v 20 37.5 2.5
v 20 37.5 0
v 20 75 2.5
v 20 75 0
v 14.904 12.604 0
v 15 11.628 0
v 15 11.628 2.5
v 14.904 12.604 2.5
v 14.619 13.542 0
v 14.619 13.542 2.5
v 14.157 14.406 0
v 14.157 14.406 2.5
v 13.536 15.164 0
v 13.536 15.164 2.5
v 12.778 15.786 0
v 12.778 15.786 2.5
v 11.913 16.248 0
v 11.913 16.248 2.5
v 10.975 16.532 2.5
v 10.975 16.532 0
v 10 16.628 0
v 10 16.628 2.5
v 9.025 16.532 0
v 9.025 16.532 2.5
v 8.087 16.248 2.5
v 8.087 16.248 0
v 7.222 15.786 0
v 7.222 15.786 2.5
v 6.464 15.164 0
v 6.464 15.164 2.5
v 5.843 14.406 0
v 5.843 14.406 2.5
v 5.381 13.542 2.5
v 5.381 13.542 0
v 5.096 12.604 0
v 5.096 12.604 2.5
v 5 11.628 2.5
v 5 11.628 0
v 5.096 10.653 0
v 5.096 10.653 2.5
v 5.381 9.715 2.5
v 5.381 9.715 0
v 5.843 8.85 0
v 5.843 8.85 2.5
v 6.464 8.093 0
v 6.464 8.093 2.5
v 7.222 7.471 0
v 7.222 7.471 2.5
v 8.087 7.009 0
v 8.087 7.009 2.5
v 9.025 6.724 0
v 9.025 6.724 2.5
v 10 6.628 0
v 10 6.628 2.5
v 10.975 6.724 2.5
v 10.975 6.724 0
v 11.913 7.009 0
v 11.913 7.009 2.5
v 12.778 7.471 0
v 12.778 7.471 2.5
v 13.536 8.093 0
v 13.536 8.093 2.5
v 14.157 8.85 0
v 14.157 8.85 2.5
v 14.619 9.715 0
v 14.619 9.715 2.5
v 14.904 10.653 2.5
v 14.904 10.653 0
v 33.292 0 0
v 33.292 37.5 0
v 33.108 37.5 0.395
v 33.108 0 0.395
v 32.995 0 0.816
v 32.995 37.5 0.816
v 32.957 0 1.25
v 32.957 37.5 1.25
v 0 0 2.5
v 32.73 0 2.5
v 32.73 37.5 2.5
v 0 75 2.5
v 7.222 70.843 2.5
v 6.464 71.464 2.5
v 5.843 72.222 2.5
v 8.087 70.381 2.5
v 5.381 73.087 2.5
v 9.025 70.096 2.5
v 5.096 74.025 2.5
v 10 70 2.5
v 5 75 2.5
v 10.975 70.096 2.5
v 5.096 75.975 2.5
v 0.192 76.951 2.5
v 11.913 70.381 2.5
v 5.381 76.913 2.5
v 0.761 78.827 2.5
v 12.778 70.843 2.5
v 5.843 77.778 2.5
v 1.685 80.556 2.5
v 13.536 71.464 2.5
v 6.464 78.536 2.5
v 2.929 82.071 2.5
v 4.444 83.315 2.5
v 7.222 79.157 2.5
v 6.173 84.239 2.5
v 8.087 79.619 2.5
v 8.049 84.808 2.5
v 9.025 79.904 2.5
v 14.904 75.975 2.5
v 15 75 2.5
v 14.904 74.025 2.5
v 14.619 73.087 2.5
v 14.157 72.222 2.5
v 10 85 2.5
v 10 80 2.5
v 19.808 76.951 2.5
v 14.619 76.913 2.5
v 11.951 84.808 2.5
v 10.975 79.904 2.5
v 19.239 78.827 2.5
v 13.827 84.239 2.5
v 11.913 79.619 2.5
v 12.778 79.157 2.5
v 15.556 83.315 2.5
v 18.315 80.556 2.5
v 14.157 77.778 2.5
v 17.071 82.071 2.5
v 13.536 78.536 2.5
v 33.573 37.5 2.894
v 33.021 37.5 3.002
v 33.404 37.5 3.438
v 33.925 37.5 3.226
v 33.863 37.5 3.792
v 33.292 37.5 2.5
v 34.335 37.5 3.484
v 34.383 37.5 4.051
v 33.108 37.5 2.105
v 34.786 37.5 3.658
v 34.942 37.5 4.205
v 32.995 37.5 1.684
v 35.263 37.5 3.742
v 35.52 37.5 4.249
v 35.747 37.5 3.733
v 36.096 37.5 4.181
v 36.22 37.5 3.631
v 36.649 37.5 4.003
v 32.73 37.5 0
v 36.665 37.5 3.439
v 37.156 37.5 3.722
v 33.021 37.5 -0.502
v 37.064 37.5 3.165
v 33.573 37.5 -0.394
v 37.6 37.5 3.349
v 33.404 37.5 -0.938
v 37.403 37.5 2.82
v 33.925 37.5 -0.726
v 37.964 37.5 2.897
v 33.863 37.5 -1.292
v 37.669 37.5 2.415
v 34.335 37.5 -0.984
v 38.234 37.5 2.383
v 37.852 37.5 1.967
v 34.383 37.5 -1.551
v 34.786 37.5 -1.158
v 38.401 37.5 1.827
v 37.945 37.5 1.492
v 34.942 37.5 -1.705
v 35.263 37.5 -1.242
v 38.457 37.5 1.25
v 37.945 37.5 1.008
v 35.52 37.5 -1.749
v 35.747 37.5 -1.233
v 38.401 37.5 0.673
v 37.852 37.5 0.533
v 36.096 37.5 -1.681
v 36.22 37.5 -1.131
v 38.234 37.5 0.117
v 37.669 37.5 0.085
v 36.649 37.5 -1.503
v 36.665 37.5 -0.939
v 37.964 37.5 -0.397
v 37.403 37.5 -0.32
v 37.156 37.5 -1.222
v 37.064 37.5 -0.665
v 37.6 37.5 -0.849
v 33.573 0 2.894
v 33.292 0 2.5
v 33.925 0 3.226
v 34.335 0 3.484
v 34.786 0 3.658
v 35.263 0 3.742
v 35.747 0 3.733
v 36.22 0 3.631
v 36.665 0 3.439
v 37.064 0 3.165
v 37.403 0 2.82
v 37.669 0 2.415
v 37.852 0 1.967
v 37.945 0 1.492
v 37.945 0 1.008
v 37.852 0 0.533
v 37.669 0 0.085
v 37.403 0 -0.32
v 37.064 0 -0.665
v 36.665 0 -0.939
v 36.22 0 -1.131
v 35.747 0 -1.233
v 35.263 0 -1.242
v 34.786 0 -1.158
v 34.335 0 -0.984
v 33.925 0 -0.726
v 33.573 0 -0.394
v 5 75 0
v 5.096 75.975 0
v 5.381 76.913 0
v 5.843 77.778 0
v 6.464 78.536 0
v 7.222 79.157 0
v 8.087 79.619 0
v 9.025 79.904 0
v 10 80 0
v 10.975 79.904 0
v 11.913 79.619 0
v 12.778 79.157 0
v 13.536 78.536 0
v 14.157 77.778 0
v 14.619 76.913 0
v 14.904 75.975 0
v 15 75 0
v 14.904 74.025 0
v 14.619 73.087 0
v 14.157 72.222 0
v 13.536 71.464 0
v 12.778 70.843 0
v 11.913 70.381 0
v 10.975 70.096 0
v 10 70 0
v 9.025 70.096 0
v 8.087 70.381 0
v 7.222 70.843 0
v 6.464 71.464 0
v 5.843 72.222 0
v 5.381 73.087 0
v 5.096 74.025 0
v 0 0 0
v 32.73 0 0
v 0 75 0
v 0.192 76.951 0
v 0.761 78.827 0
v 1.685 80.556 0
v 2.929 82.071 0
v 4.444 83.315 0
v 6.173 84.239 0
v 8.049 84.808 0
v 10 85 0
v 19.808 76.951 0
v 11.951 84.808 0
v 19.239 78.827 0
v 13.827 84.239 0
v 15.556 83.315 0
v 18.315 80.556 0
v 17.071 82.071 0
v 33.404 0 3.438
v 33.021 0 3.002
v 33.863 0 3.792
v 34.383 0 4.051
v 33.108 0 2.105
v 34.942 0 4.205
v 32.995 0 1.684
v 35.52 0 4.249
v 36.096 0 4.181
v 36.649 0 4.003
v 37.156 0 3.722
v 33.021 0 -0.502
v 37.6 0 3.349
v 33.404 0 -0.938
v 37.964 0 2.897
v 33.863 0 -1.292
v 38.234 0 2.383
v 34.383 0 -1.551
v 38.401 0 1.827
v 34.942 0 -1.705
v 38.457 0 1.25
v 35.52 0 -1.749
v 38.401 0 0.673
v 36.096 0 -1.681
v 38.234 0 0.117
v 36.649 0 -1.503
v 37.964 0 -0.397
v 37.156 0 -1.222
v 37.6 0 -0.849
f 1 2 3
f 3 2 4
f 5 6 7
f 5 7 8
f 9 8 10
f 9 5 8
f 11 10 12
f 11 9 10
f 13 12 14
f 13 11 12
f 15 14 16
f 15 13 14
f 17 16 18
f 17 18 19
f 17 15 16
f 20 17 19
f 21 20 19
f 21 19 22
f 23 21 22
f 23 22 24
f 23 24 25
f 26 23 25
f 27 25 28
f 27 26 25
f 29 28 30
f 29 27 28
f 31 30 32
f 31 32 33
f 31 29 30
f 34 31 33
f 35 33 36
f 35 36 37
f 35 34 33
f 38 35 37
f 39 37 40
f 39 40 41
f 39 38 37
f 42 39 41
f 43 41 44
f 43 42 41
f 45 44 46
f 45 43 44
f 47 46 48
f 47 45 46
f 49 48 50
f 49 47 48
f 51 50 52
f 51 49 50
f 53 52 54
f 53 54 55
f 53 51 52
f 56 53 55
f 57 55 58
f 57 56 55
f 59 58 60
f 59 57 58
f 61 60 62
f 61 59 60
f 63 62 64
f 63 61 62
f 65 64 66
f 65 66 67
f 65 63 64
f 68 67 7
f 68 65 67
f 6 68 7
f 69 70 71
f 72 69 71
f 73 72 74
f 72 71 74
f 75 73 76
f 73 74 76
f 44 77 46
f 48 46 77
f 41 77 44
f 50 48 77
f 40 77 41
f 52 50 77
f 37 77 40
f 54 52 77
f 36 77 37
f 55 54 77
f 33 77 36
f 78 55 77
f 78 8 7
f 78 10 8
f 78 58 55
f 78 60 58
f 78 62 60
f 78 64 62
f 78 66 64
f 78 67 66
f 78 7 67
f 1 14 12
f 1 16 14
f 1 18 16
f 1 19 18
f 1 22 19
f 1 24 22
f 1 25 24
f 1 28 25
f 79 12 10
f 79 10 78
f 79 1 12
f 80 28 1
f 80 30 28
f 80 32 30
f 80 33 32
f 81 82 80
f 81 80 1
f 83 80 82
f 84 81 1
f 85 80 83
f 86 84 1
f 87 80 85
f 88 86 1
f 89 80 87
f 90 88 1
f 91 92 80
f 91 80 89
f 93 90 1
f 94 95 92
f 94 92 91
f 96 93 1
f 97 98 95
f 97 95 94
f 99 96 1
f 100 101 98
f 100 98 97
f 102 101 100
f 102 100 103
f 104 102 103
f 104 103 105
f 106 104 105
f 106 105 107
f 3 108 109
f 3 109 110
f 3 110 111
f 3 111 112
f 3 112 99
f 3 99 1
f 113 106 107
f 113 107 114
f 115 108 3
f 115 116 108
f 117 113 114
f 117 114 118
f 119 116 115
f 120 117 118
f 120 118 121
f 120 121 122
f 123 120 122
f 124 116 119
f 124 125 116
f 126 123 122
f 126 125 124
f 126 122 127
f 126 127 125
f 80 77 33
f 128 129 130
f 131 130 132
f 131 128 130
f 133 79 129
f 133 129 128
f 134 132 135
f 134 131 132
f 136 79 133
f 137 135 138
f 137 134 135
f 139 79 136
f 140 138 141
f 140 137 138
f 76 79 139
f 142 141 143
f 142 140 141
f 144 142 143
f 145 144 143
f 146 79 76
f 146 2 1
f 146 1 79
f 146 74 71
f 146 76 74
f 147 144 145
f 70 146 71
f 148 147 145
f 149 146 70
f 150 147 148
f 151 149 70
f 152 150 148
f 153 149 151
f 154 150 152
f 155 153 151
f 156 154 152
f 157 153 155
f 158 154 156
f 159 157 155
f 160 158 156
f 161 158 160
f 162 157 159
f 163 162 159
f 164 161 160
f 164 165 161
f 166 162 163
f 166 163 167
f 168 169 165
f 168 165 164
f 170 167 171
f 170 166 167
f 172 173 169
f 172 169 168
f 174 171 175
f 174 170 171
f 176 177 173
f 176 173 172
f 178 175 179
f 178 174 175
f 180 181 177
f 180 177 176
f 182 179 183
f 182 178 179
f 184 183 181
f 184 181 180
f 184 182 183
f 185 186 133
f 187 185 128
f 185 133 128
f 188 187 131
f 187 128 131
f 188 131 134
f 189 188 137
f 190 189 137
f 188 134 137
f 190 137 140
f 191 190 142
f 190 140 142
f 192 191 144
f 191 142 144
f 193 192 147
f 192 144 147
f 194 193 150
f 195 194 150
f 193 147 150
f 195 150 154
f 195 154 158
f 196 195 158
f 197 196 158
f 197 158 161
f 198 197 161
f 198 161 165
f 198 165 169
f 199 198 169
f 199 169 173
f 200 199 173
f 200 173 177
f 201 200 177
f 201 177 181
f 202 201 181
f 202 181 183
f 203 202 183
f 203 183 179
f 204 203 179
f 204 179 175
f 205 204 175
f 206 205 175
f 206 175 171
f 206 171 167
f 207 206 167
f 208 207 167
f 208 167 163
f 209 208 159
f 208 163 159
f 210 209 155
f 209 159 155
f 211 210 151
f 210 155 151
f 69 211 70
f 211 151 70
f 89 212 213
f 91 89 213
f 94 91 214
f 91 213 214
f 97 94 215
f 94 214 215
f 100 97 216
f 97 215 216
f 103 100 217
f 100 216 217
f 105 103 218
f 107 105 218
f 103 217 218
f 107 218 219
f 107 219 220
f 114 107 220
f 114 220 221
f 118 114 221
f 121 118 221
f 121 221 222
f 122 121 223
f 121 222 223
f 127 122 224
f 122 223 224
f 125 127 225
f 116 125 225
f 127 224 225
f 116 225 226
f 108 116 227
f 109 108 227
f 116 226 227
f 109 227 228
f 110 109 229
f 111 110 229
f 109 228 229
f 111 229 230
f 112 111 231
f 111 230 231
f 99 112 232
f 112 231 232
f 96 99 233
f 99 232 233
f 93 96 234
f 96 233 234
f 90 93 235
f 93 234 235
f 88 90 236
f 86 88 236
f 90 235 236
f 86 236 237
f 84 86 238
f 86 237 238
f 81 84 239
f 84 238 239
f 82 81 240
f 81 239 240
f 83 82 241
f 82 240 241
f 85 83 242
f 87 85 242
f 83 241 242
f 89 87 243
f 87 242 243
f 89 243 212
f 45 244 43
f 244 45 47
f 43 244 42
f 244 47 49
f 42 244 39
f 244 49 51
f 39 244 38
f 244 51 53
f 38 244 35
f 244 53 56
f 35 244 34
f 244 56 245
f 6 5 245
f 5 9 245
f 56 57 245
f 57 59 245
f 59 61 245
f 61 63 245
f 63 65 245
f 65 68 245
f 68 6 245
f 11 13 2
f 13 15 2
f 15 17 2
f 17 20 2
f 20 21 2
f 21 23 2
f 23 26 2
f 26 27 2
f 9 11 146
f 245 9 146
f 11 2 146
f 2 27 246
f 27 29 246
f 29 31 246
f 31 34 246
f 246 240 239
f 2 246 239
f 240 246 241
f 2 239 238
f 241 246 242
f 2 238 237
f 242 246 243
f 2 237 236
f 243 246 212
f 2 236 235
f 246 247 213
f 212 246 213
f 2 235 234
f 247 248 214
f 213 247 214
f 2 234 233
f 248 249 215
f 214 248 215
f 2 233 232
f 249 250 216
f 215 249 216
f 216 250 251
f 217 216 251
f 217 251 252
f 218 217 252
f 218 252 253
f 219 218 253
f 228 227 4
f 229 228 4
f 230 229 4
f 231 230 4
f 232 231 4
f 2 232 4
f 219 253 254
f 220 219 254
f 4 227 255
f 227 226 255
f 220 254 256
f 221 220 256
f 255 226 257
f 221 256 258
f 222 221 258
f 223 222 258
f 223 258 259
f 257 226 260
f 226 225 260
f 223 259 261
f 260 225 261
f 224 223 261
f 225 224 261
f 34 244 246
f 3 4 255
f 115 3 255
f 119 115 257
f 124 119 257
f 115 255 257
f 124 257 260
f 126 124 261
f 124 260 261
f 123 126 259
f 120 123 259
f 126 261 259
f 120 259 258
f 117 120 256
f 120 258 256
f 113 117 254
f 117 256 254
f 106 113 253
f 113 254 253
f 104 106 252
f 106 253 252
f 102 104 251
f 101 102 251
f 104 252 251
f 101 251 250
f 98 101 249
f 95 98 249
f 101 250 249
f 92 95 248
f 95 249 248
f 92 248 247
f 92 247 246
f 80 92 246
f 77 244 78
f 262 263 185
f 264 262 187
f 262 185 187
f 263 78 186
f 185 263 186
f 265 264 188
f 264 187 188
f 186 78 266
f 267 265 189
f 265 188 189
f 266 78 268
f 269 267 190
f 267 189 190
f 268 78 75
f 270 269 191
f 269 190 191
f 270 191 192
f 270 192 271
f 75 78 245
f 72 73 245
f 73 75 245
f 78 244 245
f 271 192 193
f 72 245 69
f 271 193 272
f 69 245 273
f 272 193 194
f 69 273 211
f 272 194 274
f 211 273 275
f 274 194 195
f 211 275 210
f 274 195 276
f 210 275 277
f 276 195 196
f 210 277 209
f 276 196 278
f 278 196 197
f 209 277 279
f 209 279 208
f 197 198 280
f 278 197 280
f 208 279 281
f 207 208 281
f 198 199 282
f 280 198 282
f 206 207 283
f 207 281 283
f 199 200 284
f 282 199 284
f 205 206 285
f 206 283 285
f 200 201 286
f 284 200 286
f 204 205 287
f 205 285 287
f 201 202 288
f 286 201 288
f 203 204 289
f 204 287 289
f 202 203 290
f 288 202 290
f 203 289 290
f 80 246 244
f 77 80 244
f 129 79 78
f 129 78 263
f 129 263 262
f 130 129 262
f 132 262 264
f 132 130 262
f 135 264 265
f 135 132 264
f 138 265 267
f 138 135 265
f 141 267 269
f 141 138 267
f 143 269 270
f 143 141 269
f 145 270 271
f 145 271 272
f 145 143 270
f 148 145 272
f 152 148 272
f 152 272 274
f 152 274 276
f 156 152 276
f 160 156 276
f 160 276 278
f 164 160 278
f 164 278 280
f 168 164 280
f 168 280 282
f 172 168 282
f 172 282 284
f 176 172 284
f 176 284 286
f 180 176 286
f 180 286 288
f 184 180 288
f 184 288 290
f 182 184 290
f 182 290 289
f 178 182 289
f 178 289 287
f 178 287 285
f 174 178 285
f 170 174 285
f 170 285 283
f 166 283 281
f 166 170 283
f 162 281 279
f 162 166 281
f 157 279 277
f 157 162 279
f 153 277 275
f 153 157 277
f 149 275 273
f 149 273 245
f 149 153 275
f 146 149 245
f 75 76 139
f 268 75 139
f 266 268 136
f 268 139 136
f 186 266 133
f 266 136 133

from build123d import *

# Parameters (mm, degrees)
F0_R     = 5
F0_W     = 15.4567654431
F0_H     = 37.5
F1_DEPTH = 2.5
F3_DEPTH = 37.501
F2_R     = 3
F2_R_2   = 2.5
F4_DEPTH = 37.5


with BuildPart() as f1:
    # F0 (on Top) → F1 (new body)
    with BuildSketch(Plane.XY):
        with BuildLine():
            Line((0, 75), (0, 0))
            Line((0, 0), (20, 0))
            Line((20, 0), (20, 37.5))
            Line((20, 37.5), (20, 75))
            ThreePointArc((20, 75), (10, 65), (0, 75))
        make_face()
        with Locations((10, 11.628289707)):
            Circle(F0_R, mode=Mode.SUBTRACT)
        with Locations((27.7283827215, 18.75)):
            Rectangle(F0_W, F0_H)
        with BuildLine():
            ThreePointArc((20, 75), (10, 85), (0, 75))
            Line((0, 75), (5, 75))
            ThreePointArc((5, 75), (10, 80), (15, 75))
            Line((15, 75), (20, 75))
        make_face()
        with BuildLine():
            Line((5, 75), (0, 75))
            ThreePointArc((0, 75), (10, 65), (20, 75))
            Line((20, 75), (15, 75))
            ThreePointArc((15, 75), (10, 70), (5, 75))
        make_face()
    extrude(amount=F1_DEPTH)

    # F2 (on face) → F3 (cut, through all)
    with BuildSketch(Plane(origin=(0, 37.5, 0), x_dir=(-1, 0, 0), z_dir=(0, 1, 0))):
        with BuildLine():
            ThreePointArc((-32.9567654431, 1.25), (-33.0419508774, 1.8970476128), (-33.2917019336, 2.5))
            Line((-33.2917019336, 2.5), (-35.4567654431, 2.5))
            Line((-35.4567654431, 2.5), (-35.4567654431, 0))
            Line((-35.4567654431, 0), (-33.2917019336, 0))
            ThreePointArc((-33.2917019336, 0), (-33.0419508774, 0.6029523872), (-32.9567654431, 1.25))
        make_face()
    extrude(amount=-F3_DEPTH, mode=Mode.SUBTRACT)

    # F2 (on face) → F4 (join)
    with BuildSketch(Plane(origin=(0, 37.5, 0), x_dir=(-1, 0, 0), z_dir=(0, 1, 0))):
        with Locations((-35.4567654431, 1.25)):
            Circle(F2_R)
        with Locations((-35.4567654431, 1.25)):
            Circle(F2_R_2, mode=Mode.SUBTRACT)
    extrude(amount=-F4_DEPTH)


solid = f1.part
